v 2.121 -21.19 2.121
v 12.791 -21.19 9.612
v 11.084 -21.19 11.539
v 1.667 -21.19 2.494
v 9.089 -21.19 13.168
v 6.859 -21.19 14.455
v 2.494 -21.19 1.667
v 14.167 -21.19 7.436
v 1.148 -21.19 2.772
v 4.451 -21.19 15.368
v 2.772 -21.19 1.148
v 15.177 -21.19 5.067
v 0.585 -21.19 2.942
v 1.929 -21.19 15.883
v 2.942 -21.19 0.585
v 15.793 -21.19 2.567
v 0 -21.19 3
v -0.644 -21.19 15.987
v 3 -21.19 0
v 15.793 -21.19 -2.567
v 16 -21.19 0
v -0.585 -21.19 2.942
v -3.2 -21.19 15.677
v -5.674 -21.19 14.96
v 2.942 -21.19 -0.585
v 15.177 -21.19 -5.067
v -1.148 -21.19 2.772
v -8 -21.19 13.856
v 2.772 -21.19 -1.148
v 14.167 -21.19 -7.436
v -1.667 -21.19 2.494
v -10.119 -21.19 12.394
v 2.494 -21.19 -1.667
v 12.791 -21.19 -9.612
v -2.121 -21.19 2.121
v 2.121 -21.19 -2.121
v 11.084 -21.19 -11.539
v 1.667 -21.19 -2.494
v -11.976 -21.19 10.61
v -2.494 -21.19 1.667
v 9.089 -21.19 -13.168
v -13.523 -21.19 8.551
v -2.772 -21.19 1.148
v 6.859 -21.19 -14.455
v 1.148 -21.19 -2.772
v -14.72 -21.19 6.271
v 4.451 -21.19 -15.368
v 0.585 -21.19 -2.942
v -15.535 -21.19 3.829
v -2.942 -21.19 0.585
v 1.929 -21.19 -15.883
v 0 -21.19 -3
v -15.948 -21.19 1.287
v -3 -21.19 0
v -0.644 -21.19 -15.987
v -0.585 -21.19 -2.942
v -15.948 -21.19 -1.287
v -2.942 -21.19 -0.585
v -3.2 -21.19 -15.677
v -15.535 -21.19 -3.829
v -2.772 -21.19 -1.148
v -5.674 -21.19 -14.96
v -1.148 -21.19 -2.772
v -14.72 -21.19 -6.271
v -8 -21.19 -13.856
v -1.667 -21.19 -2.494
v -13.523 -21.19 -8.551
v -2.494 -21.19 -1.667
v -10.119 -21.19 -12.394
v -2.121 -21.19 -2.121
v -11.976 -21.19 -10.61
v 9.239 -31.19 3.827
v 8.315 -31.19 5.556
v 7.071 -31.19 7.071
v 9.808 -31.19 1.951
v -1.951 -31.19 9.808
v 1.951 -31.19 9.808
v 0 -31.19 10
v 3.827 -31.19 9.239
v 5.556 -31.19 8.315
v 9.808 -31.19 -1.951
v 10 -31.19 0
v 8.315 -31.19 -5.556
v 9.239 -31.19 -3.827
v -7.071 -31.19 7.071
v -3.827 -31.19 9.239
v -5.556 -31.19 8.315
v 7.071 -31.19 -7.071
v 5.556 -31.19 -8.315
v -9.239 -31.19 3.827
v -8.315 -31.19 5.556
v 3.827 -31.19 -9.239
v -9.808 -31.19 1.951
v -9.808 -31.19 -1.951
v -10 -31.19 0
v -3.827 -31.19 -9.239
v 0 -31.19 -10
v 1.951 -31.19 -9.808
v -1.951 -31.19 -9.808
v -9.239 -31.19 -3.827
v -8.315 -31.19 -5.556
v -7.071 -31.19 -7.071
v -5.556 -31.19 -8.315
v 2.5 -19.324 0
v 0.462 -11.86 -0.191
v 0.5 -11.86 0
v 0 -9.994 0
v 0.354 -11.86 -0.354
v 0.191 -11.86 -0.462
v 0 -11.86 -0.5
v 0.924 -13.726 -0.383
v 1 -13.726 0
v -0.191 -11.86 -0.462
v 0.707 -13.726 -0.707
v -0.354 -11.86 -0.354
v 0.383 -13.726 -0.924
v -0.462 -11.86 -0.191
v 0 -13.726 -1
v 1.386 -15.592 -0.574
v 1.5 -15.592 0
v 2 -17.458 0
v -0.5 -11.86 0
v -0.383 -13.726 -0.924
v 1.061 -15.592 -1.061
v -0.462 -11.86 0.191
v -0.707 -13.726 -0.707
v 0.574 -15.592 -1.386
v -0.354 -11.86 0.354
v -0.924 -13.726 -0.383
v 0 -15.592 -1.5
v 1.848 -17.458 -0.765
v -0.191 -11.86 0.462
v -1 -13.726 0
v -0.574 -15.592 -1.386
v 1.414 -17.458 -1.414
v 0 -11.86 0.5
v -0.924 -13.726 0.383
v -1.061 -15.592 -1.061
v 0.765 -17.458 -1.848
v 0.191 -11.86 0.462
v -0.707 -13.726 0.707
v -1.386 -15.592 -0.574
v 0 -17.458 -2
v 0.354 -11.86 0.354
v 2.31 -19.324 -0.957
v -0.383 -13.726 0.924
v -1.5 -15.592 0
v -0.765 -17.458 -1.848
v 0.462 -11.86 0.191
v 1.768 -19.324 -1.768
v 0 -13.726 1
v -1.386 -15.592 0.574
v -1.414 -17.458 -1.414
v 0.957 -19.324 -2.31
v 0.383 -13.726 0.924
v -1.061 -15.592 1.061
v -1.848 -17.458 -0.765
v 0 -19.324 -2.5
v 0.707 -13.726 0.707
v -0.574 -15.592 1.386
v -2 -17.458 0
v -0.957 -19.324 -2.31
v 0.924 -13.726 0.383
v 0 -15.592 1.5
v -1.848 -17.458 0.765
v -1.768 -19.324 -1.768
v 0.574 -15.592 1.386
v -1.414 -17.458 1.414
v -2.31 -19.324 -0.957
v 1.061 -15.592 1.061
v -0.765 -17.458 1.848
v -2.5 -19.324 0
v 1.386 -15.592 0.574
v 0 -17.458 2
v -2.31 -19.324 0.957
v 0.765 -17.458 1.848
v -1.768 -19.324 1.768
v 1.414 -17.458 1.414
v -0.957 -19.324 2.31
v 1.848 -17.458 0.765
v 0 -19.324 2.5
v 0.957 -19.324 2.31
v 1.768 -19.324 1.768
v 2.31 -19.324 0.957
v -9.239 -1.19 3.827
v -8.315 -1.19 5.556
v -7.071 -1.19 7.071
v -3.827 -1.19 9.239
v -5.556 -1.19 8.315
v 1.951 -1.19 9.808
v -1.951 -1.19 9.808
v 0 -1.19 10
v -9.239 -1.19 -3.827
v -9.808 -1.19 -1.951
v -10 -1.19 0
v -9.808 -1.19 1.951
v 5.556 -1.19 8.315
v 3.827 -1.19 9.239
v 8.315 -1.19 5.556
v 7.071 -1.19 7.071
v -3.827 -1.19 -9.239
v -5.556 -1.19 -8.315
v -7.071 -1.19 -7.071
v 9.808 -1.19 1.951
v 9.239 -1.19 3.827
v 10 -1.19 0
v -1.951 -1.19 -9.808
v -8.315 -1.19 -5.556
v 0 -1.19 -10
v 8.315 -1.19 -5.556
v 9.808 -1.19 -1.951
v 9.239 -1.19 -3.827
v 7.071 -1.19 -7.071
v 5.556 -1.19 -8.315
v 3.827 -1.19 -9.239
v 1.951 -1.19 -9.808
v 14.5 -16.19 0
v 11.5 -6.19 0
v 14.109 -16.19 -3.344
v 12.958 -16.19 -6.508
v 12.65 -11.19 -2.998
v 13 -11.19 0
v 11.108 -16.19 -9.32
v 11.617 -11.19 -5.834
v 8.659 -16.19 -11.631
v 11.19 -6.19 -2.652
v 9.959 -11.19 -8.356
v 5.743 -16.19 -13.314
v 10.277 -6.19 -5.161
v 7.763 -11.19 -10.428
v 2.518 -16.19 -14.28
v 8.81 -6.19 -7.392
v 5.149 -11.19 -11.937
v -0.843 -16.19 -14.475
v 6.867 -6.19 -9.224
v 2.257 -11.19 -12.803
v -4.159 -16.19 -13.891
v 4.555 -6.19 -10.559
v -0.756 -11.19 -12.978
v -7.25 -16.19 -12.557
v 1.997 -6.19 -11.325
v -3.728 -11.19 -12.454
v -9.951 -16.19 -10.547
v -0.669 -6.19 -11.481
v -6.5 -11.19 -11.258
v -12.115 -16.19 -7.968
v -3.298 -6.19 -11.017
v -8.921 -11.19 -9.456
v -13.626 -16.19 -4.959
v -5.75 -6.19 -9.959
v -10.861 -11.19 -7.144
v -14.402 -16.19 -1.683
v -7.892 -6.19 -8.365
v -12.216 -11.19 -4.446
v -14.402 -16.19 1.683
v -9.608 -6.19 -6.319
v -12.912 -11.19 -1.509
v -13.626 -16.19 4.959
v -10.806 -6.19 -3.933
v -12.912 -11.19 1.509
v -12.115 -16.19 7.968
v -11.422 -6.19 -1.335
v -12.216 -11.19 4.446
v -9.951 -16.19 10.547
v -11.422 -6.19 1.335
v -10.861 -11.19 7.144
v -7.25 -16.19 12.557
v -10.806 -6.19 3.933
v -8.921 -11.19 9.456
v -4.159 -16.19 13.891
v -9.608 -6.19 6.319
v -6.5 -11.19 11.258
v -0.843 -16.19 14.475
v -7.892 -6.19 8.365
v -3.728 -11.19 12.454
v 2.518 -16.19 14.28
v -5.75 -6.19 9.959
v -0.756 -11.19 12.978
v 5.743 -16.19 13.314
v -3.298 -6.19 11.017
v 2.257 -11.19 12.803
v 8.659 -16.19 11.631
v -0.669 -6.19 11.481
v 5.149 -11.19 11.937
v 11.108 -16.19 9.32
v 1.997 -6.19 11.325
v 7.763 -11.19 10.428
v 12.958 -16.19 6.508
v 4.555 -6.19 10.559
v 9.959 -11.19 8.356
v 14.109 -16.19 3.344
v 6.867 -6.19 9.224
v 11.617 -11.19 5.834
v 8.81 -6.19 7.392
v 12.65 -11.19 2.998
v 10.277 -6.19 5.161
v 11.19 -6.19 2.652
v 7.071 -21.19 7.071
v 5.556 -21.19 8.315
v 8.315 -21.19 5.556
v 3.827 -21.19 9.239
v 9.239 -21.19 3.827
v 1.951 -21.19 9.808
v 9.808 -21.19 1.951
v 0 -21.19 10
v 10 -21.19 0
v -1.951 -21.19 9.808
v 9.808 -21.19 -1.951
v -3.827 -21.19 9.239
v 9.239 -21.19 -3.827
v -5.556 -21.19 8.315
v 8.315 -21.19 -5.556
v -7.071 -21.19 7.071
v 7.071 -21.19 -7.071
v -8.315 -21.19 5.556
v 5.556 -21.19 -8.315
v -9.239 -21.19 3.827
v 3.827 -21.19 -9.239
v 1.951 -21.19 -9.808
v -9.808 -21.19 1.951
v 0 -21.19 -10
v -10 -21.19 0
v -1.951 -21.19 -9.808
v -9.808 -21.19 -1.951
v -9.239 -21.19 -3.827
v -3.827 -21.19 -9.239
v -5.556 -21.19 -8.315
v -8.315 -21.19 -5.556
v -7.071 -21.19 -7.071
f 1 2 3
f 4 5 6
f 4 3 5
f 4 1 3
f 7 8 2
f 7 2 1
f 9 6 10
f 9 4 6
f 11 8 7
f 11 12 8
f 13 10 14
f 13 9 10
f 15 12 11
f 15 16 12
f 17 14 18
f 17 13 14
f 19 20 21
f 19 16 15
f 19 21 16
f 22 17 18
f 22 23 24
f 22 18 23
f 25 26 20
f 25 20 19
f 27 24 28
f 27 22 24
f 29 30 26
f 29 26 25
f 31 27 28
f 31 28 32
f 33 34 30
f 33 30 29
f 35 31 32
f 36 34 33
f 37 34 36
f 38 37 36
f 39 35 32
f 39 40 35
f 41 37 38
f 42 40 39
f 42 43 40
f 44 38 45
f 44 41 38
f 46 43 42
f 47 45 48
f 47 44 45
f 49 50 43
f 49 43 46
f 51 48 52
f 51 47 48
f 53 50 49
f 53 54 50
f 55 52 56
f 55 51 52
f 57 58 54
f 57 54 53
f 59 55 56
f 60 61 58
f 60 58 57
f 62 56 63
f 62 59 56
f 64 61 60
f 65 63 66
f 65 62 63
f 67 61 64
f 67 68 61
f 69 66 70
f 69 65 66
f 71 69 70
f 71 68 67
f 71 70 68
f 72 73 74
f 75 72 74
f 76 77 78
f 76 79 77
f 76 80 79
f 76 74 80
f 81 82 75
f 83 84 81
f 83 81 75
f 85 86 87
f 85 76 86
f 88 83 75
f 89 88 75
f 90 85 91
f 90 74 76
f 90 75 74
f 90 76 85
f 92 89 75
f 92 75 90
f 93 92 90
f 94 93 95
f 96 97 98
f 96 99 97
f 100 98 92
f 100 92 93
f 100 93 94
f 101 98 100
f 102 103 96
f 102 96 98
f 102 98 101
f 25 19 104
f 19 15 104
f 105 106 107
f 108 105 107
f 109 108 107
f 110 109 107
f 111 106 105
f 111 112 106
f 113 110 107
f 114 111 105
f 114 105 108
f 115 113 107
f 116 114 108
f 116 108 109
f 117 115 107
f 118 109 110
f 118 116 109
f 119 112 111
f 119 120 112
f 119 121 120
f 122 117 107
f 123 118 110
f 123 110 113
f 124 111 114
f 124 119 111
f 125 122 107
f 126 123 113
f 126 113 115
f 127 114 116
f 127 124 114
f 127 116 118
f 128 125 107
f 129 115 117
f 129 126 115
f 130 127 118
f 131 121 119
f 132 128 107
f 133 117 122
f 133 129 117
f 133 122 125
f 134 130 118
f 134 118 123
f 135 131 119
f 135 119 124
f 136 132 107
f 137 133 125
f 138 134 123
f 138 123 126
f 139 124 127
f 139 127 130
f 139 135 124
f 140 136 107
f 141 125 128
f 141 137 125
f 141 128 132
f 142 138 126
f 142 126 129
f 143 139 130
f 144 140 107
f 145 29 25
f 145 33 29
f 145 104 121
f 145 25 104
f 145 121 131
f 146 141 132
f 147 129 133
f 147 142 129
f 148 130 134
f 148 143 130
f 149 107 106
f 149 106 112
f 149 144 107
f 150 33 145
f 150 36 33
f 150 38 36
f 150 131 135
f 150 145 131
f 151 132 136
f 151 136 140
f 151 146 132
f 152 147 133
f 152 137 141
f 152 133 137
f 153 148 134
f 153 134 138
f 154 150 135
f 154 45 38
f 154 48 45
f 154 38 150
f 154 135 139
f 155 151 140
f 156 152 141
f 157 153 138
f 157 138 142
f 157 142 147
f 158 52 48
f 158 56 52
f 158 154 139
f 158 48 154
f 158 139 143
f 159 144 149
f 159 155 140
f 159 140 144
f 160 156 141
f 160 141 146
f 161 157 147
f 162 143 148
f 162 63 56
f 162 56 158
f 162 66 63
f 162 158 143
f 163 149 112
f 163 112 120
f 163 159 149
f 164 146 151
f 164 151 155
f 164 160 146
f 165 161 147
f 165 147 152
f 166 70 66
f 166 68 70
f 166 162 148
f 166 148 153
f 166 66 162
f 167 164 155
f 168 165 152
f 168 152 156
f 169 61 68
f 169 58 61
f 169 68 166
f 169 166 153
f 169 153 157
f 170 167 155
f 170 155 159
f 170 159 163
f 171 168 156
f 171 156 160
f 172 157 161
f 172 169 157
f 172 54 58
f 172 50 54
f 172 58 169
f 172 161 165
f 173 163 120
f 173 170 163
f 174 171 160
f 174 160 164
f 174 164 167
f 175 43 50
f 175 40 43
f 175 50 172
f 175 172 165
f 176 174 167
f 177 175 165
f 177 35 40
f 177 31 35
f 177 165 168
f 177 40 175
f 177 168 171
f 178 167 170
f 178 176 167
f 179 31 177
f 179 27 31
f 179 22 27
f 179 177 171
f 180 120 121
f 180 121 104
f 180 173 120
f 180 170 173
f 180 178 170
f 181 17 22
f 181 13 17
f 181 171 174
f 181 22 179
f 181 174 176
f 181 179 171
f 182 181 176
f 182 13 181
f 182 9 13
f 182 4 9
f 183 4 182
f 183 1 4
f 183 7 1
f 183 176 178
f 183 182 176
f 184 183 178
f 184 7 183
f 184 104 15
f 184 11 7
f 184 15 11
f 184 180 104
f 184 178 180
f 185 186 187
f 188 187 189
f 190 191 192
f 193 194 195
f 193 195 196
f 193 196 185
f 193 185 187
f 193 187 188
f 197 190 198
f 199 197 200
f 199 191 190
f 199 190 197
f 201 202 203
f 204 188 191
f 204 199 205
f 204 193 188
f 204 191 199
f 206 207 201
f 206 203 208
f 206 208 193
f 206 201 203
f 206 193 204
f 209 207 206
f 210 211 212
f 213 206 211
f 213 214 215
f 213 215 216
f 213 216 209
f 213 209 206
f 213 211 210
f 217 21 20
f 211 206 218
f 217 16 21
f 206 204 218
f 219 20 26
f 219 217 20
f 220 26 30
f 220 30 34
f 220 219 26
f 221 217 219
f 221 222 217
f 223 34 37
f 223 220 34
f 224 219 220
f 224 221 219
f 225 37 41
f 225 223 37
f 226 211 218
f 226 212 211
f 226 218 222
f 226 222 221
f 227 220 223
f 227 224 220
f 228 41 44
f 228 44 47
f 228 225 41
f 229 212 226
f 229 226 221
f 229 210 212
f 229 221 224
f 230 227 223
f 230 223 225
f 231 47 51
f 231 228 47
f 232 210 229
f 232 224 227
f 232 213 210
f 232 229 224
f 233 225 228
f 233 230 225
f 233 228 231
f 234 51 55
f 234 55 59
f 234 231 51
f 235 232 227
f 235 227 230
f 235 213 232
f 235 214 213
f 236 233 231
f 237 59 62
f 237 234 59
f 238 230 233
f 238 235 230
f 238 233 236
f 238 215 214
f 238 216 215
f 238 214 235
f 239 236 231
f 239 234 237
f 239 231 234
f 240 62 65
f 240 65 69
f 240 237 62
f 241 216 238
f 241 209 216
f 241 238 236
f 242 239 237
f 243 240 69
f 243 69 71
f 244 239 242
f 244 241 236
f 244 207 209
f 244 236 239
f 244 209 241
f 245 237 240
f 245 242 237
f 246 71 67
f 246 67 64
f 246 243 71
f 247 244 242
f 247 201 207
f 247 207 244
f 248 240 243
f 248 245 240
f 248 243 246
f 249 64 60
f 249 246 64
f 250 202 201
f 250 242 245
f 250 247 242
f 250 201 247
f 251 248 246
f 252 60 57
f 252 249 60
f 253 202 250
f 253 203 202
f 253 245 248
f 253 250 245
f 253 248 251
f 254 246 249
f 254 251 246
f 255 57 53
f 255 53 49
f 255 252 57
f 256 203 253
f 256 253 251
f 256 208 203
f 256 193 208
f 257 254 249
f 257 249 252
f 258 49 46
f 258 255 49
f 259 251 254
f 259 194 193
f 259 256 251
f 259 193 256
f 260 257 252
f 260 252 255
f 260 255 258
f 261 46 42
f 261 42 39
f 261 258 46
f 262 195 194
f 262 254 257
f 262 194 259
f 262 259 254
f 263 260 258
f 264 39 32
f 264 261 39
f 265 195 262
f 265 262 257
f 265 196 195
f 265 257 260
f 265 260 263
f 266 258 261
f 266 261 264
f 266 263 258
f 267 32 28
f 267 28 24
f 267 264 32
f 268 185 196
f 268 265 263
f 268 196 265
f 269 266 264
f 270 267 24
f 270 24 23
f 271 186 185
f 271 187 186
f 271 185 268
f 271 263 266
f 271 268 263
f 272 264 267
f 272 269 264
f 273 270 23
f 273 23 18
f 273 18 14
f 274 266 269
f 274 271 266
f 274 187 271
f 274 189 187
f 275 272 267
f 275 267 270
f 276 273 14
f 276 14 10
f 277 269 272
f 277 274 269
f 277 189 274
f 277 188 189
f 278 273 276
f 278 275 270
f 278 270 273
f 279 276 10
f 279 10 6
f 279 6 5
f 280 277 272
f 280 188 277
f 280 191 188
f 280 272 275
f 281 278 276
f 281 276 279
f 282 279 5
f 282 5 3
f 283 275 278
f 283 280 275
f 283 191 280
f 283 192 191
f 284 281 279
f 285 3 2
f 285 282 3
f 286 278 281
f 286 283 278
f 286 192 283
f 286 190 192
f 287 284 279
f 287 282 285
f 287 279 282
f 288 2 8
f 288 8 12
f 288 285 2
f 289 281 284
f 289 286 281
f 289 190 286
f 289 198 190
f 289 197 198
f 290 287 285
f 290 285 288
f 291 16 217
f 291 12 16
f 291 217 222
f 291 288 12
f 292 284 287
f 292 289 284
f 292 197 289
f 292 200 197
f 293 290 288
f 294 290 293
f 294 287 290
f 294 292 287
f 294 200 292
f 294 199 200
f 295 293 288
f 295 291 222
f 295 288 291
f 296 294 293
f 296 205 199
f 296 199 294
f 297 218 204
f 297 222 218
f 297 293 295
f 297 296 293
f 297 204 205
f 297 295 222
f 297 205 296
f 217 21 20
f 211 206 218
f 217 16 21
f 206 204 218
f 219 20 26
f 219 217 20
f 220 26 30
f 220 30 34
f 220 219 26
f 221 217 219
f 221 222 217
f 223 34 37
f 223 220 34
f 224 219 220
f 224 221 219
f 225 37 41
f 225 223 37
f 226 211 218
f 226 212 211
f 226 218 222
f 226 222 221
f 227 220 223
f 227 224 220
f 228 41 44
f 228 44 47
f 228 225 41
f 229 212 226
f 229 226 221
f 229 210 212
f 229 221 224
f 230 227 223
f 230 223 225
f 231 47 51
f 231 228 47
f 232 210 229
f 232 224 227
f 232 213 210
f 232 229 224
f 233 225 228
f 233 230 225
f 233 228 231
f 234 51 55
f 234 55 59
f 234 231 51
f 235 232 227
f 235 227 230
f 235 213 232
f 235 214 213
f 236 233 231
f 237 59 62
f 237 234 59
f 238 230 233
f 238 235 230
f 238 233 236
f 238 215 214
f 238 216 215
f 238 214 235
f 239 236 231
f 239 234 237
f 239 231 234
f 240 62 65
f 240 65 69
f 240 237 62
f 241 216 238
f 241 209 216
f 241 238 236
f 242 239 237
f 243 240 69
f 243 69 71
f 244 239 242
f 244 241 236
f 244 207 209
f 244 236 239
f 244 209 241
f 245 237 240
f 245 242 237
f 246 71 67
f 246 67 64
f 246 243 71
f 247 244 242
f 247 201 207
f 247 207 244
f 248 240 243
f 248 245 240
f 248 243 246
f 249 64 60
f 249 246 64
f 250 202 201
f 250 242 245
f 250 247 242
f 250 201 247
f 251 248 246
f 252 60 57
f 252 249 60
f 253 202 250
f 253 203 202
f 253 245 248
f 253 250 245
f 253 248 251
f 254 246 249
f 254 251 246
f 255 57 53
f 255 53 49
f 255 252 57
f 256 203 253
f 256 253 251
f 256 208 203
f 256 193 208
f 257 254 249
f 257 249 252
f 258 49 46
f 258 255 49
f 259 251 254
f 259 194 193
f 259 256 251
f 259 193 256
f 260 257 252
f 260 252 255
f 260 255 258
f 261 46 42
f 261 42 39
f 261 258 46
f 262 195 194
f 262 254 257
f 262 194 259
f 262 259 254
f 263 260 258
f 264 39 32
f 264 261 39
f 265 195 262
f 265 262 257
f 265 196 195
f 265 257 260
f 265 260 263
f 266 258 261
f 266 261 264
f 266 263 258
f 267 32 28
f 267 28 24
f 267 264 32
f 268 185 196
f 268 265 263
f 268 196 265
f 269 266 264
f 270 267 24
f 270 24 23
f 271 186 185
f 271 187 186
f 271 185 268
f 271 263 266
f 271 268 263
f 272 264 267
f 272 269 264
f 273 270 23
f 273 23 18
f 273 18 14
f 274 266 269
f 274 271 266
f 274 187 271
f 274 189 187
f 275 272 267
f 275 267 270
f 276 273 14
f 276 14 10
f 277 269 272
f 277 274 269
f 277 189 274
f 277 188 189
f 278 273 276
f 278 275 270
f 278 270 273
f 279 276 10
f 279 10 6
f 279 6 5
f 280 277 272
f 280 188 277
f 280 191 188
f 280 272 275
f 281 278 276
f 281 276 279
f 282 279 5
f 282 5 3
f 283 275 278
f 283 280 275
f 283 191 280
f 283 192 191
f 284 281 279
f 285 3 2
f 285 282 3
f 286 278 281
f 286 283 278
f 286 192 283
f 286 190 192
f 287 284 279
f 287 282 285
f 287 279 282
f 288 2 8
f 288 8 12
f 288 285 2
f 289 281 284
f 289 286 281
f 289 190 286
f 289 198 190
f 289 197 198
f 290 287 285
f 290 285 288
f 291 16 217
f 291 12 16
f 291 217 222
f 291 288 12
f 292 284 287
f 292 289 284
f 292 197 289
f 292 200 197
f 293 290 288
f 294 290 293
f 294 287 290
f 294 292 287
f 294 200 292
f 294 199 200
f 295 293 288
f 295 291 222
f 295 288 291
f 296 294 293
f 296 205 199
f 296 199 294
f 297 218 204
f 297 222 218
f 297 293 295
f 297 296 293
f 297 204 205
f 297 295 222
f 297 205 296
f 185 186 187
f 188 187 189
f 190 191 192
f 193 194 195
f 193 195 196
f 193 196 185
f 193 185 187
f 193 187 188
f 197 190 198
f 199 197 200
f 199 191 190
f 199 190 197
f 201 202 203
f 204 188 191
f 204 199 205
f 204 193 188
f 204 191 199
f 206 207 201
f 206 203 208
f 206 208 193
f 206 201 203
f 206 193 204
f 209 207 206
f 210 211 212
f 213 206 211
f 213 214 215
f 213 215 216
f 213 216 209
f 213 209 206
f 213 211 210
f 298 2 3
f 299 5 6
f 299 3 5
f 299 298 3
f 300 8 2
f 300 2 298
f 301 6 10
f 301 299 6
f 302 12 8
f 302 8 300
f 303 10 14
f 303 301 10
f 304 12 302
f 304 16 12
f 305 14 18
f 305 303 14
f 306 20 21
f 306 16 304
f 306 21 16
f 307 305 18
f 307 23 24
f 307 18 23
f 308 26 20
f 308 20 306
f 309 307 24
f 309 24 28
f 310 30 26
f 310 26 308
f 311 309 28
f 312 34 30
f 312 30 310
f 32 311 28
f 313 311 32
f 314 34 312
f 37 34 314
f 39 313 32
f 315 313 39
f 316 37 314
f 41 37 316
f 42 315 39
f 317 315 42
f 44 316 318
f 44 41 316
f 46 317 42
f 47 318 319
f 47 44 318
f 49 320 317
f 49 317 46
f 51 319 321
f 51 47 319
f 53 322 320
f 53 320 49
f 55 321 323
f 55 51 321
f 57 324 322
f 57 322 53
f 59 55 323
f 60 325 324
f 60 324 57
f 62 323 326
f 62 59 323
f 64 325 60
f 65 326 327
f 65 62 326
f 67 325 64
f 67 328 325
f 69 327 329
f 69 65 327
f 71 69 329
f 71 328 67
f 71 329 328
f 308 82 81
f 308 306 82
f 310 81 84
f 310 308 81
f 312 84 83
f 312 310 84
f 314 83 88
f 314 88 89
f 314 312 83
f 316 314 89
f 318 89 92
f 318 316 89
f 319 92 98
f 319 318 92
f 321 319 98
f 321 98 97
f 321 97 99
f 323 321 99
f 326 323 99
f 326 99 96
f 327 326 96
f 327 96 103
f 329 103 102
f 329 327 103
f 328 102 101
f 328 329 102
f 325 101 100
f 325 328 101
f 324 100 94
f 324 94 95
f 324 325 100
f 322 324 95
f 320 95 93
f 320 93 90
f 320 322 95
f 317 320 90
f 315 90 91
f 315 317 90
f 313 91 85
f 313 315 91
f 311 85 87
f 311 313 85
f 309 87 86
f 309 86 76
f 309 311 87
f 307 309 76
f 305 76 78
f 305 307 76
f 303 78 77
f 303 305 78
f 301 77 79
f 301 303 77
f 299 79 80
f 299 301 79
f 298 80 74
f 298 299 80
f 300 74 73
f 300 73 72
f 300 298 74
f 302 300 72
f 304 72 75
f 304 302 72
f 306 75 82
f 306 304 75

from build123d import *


with BuildPart() as f1:
    # F0 (on Top) → F1 (revolve)
    with BuildSketch(Plane.XY):
        Polygon((16, -21.189935), (10, -1.189935), (0, -1.189935), (0, -9.993782), (3, -21.189935), (10, -21.189935), align=None)
    revolve(axis=Axis((0, -5.591858, 0), (0, 1, 0)))


with BuildPart() as f2:
    # F0 (on Top) → F2 (revolve)
    with BuildSketch(Plane.XY):
        Polygon((16, -21.189935), (10, -1.189935), (0, -1.189935), (0, -9.993782), (3, -21.189935), (10, -21.189935), align=None)
        Polygon((10, -31.189935), (10, -21.189935), (3, -21.189935), (0, -9.993782), (0, -31.189935), align=None)
    revolve(axis=Axis((0, -5.591858, 0), (0, 1, 0)))


solid = Compound([f1.part, f2.part])
